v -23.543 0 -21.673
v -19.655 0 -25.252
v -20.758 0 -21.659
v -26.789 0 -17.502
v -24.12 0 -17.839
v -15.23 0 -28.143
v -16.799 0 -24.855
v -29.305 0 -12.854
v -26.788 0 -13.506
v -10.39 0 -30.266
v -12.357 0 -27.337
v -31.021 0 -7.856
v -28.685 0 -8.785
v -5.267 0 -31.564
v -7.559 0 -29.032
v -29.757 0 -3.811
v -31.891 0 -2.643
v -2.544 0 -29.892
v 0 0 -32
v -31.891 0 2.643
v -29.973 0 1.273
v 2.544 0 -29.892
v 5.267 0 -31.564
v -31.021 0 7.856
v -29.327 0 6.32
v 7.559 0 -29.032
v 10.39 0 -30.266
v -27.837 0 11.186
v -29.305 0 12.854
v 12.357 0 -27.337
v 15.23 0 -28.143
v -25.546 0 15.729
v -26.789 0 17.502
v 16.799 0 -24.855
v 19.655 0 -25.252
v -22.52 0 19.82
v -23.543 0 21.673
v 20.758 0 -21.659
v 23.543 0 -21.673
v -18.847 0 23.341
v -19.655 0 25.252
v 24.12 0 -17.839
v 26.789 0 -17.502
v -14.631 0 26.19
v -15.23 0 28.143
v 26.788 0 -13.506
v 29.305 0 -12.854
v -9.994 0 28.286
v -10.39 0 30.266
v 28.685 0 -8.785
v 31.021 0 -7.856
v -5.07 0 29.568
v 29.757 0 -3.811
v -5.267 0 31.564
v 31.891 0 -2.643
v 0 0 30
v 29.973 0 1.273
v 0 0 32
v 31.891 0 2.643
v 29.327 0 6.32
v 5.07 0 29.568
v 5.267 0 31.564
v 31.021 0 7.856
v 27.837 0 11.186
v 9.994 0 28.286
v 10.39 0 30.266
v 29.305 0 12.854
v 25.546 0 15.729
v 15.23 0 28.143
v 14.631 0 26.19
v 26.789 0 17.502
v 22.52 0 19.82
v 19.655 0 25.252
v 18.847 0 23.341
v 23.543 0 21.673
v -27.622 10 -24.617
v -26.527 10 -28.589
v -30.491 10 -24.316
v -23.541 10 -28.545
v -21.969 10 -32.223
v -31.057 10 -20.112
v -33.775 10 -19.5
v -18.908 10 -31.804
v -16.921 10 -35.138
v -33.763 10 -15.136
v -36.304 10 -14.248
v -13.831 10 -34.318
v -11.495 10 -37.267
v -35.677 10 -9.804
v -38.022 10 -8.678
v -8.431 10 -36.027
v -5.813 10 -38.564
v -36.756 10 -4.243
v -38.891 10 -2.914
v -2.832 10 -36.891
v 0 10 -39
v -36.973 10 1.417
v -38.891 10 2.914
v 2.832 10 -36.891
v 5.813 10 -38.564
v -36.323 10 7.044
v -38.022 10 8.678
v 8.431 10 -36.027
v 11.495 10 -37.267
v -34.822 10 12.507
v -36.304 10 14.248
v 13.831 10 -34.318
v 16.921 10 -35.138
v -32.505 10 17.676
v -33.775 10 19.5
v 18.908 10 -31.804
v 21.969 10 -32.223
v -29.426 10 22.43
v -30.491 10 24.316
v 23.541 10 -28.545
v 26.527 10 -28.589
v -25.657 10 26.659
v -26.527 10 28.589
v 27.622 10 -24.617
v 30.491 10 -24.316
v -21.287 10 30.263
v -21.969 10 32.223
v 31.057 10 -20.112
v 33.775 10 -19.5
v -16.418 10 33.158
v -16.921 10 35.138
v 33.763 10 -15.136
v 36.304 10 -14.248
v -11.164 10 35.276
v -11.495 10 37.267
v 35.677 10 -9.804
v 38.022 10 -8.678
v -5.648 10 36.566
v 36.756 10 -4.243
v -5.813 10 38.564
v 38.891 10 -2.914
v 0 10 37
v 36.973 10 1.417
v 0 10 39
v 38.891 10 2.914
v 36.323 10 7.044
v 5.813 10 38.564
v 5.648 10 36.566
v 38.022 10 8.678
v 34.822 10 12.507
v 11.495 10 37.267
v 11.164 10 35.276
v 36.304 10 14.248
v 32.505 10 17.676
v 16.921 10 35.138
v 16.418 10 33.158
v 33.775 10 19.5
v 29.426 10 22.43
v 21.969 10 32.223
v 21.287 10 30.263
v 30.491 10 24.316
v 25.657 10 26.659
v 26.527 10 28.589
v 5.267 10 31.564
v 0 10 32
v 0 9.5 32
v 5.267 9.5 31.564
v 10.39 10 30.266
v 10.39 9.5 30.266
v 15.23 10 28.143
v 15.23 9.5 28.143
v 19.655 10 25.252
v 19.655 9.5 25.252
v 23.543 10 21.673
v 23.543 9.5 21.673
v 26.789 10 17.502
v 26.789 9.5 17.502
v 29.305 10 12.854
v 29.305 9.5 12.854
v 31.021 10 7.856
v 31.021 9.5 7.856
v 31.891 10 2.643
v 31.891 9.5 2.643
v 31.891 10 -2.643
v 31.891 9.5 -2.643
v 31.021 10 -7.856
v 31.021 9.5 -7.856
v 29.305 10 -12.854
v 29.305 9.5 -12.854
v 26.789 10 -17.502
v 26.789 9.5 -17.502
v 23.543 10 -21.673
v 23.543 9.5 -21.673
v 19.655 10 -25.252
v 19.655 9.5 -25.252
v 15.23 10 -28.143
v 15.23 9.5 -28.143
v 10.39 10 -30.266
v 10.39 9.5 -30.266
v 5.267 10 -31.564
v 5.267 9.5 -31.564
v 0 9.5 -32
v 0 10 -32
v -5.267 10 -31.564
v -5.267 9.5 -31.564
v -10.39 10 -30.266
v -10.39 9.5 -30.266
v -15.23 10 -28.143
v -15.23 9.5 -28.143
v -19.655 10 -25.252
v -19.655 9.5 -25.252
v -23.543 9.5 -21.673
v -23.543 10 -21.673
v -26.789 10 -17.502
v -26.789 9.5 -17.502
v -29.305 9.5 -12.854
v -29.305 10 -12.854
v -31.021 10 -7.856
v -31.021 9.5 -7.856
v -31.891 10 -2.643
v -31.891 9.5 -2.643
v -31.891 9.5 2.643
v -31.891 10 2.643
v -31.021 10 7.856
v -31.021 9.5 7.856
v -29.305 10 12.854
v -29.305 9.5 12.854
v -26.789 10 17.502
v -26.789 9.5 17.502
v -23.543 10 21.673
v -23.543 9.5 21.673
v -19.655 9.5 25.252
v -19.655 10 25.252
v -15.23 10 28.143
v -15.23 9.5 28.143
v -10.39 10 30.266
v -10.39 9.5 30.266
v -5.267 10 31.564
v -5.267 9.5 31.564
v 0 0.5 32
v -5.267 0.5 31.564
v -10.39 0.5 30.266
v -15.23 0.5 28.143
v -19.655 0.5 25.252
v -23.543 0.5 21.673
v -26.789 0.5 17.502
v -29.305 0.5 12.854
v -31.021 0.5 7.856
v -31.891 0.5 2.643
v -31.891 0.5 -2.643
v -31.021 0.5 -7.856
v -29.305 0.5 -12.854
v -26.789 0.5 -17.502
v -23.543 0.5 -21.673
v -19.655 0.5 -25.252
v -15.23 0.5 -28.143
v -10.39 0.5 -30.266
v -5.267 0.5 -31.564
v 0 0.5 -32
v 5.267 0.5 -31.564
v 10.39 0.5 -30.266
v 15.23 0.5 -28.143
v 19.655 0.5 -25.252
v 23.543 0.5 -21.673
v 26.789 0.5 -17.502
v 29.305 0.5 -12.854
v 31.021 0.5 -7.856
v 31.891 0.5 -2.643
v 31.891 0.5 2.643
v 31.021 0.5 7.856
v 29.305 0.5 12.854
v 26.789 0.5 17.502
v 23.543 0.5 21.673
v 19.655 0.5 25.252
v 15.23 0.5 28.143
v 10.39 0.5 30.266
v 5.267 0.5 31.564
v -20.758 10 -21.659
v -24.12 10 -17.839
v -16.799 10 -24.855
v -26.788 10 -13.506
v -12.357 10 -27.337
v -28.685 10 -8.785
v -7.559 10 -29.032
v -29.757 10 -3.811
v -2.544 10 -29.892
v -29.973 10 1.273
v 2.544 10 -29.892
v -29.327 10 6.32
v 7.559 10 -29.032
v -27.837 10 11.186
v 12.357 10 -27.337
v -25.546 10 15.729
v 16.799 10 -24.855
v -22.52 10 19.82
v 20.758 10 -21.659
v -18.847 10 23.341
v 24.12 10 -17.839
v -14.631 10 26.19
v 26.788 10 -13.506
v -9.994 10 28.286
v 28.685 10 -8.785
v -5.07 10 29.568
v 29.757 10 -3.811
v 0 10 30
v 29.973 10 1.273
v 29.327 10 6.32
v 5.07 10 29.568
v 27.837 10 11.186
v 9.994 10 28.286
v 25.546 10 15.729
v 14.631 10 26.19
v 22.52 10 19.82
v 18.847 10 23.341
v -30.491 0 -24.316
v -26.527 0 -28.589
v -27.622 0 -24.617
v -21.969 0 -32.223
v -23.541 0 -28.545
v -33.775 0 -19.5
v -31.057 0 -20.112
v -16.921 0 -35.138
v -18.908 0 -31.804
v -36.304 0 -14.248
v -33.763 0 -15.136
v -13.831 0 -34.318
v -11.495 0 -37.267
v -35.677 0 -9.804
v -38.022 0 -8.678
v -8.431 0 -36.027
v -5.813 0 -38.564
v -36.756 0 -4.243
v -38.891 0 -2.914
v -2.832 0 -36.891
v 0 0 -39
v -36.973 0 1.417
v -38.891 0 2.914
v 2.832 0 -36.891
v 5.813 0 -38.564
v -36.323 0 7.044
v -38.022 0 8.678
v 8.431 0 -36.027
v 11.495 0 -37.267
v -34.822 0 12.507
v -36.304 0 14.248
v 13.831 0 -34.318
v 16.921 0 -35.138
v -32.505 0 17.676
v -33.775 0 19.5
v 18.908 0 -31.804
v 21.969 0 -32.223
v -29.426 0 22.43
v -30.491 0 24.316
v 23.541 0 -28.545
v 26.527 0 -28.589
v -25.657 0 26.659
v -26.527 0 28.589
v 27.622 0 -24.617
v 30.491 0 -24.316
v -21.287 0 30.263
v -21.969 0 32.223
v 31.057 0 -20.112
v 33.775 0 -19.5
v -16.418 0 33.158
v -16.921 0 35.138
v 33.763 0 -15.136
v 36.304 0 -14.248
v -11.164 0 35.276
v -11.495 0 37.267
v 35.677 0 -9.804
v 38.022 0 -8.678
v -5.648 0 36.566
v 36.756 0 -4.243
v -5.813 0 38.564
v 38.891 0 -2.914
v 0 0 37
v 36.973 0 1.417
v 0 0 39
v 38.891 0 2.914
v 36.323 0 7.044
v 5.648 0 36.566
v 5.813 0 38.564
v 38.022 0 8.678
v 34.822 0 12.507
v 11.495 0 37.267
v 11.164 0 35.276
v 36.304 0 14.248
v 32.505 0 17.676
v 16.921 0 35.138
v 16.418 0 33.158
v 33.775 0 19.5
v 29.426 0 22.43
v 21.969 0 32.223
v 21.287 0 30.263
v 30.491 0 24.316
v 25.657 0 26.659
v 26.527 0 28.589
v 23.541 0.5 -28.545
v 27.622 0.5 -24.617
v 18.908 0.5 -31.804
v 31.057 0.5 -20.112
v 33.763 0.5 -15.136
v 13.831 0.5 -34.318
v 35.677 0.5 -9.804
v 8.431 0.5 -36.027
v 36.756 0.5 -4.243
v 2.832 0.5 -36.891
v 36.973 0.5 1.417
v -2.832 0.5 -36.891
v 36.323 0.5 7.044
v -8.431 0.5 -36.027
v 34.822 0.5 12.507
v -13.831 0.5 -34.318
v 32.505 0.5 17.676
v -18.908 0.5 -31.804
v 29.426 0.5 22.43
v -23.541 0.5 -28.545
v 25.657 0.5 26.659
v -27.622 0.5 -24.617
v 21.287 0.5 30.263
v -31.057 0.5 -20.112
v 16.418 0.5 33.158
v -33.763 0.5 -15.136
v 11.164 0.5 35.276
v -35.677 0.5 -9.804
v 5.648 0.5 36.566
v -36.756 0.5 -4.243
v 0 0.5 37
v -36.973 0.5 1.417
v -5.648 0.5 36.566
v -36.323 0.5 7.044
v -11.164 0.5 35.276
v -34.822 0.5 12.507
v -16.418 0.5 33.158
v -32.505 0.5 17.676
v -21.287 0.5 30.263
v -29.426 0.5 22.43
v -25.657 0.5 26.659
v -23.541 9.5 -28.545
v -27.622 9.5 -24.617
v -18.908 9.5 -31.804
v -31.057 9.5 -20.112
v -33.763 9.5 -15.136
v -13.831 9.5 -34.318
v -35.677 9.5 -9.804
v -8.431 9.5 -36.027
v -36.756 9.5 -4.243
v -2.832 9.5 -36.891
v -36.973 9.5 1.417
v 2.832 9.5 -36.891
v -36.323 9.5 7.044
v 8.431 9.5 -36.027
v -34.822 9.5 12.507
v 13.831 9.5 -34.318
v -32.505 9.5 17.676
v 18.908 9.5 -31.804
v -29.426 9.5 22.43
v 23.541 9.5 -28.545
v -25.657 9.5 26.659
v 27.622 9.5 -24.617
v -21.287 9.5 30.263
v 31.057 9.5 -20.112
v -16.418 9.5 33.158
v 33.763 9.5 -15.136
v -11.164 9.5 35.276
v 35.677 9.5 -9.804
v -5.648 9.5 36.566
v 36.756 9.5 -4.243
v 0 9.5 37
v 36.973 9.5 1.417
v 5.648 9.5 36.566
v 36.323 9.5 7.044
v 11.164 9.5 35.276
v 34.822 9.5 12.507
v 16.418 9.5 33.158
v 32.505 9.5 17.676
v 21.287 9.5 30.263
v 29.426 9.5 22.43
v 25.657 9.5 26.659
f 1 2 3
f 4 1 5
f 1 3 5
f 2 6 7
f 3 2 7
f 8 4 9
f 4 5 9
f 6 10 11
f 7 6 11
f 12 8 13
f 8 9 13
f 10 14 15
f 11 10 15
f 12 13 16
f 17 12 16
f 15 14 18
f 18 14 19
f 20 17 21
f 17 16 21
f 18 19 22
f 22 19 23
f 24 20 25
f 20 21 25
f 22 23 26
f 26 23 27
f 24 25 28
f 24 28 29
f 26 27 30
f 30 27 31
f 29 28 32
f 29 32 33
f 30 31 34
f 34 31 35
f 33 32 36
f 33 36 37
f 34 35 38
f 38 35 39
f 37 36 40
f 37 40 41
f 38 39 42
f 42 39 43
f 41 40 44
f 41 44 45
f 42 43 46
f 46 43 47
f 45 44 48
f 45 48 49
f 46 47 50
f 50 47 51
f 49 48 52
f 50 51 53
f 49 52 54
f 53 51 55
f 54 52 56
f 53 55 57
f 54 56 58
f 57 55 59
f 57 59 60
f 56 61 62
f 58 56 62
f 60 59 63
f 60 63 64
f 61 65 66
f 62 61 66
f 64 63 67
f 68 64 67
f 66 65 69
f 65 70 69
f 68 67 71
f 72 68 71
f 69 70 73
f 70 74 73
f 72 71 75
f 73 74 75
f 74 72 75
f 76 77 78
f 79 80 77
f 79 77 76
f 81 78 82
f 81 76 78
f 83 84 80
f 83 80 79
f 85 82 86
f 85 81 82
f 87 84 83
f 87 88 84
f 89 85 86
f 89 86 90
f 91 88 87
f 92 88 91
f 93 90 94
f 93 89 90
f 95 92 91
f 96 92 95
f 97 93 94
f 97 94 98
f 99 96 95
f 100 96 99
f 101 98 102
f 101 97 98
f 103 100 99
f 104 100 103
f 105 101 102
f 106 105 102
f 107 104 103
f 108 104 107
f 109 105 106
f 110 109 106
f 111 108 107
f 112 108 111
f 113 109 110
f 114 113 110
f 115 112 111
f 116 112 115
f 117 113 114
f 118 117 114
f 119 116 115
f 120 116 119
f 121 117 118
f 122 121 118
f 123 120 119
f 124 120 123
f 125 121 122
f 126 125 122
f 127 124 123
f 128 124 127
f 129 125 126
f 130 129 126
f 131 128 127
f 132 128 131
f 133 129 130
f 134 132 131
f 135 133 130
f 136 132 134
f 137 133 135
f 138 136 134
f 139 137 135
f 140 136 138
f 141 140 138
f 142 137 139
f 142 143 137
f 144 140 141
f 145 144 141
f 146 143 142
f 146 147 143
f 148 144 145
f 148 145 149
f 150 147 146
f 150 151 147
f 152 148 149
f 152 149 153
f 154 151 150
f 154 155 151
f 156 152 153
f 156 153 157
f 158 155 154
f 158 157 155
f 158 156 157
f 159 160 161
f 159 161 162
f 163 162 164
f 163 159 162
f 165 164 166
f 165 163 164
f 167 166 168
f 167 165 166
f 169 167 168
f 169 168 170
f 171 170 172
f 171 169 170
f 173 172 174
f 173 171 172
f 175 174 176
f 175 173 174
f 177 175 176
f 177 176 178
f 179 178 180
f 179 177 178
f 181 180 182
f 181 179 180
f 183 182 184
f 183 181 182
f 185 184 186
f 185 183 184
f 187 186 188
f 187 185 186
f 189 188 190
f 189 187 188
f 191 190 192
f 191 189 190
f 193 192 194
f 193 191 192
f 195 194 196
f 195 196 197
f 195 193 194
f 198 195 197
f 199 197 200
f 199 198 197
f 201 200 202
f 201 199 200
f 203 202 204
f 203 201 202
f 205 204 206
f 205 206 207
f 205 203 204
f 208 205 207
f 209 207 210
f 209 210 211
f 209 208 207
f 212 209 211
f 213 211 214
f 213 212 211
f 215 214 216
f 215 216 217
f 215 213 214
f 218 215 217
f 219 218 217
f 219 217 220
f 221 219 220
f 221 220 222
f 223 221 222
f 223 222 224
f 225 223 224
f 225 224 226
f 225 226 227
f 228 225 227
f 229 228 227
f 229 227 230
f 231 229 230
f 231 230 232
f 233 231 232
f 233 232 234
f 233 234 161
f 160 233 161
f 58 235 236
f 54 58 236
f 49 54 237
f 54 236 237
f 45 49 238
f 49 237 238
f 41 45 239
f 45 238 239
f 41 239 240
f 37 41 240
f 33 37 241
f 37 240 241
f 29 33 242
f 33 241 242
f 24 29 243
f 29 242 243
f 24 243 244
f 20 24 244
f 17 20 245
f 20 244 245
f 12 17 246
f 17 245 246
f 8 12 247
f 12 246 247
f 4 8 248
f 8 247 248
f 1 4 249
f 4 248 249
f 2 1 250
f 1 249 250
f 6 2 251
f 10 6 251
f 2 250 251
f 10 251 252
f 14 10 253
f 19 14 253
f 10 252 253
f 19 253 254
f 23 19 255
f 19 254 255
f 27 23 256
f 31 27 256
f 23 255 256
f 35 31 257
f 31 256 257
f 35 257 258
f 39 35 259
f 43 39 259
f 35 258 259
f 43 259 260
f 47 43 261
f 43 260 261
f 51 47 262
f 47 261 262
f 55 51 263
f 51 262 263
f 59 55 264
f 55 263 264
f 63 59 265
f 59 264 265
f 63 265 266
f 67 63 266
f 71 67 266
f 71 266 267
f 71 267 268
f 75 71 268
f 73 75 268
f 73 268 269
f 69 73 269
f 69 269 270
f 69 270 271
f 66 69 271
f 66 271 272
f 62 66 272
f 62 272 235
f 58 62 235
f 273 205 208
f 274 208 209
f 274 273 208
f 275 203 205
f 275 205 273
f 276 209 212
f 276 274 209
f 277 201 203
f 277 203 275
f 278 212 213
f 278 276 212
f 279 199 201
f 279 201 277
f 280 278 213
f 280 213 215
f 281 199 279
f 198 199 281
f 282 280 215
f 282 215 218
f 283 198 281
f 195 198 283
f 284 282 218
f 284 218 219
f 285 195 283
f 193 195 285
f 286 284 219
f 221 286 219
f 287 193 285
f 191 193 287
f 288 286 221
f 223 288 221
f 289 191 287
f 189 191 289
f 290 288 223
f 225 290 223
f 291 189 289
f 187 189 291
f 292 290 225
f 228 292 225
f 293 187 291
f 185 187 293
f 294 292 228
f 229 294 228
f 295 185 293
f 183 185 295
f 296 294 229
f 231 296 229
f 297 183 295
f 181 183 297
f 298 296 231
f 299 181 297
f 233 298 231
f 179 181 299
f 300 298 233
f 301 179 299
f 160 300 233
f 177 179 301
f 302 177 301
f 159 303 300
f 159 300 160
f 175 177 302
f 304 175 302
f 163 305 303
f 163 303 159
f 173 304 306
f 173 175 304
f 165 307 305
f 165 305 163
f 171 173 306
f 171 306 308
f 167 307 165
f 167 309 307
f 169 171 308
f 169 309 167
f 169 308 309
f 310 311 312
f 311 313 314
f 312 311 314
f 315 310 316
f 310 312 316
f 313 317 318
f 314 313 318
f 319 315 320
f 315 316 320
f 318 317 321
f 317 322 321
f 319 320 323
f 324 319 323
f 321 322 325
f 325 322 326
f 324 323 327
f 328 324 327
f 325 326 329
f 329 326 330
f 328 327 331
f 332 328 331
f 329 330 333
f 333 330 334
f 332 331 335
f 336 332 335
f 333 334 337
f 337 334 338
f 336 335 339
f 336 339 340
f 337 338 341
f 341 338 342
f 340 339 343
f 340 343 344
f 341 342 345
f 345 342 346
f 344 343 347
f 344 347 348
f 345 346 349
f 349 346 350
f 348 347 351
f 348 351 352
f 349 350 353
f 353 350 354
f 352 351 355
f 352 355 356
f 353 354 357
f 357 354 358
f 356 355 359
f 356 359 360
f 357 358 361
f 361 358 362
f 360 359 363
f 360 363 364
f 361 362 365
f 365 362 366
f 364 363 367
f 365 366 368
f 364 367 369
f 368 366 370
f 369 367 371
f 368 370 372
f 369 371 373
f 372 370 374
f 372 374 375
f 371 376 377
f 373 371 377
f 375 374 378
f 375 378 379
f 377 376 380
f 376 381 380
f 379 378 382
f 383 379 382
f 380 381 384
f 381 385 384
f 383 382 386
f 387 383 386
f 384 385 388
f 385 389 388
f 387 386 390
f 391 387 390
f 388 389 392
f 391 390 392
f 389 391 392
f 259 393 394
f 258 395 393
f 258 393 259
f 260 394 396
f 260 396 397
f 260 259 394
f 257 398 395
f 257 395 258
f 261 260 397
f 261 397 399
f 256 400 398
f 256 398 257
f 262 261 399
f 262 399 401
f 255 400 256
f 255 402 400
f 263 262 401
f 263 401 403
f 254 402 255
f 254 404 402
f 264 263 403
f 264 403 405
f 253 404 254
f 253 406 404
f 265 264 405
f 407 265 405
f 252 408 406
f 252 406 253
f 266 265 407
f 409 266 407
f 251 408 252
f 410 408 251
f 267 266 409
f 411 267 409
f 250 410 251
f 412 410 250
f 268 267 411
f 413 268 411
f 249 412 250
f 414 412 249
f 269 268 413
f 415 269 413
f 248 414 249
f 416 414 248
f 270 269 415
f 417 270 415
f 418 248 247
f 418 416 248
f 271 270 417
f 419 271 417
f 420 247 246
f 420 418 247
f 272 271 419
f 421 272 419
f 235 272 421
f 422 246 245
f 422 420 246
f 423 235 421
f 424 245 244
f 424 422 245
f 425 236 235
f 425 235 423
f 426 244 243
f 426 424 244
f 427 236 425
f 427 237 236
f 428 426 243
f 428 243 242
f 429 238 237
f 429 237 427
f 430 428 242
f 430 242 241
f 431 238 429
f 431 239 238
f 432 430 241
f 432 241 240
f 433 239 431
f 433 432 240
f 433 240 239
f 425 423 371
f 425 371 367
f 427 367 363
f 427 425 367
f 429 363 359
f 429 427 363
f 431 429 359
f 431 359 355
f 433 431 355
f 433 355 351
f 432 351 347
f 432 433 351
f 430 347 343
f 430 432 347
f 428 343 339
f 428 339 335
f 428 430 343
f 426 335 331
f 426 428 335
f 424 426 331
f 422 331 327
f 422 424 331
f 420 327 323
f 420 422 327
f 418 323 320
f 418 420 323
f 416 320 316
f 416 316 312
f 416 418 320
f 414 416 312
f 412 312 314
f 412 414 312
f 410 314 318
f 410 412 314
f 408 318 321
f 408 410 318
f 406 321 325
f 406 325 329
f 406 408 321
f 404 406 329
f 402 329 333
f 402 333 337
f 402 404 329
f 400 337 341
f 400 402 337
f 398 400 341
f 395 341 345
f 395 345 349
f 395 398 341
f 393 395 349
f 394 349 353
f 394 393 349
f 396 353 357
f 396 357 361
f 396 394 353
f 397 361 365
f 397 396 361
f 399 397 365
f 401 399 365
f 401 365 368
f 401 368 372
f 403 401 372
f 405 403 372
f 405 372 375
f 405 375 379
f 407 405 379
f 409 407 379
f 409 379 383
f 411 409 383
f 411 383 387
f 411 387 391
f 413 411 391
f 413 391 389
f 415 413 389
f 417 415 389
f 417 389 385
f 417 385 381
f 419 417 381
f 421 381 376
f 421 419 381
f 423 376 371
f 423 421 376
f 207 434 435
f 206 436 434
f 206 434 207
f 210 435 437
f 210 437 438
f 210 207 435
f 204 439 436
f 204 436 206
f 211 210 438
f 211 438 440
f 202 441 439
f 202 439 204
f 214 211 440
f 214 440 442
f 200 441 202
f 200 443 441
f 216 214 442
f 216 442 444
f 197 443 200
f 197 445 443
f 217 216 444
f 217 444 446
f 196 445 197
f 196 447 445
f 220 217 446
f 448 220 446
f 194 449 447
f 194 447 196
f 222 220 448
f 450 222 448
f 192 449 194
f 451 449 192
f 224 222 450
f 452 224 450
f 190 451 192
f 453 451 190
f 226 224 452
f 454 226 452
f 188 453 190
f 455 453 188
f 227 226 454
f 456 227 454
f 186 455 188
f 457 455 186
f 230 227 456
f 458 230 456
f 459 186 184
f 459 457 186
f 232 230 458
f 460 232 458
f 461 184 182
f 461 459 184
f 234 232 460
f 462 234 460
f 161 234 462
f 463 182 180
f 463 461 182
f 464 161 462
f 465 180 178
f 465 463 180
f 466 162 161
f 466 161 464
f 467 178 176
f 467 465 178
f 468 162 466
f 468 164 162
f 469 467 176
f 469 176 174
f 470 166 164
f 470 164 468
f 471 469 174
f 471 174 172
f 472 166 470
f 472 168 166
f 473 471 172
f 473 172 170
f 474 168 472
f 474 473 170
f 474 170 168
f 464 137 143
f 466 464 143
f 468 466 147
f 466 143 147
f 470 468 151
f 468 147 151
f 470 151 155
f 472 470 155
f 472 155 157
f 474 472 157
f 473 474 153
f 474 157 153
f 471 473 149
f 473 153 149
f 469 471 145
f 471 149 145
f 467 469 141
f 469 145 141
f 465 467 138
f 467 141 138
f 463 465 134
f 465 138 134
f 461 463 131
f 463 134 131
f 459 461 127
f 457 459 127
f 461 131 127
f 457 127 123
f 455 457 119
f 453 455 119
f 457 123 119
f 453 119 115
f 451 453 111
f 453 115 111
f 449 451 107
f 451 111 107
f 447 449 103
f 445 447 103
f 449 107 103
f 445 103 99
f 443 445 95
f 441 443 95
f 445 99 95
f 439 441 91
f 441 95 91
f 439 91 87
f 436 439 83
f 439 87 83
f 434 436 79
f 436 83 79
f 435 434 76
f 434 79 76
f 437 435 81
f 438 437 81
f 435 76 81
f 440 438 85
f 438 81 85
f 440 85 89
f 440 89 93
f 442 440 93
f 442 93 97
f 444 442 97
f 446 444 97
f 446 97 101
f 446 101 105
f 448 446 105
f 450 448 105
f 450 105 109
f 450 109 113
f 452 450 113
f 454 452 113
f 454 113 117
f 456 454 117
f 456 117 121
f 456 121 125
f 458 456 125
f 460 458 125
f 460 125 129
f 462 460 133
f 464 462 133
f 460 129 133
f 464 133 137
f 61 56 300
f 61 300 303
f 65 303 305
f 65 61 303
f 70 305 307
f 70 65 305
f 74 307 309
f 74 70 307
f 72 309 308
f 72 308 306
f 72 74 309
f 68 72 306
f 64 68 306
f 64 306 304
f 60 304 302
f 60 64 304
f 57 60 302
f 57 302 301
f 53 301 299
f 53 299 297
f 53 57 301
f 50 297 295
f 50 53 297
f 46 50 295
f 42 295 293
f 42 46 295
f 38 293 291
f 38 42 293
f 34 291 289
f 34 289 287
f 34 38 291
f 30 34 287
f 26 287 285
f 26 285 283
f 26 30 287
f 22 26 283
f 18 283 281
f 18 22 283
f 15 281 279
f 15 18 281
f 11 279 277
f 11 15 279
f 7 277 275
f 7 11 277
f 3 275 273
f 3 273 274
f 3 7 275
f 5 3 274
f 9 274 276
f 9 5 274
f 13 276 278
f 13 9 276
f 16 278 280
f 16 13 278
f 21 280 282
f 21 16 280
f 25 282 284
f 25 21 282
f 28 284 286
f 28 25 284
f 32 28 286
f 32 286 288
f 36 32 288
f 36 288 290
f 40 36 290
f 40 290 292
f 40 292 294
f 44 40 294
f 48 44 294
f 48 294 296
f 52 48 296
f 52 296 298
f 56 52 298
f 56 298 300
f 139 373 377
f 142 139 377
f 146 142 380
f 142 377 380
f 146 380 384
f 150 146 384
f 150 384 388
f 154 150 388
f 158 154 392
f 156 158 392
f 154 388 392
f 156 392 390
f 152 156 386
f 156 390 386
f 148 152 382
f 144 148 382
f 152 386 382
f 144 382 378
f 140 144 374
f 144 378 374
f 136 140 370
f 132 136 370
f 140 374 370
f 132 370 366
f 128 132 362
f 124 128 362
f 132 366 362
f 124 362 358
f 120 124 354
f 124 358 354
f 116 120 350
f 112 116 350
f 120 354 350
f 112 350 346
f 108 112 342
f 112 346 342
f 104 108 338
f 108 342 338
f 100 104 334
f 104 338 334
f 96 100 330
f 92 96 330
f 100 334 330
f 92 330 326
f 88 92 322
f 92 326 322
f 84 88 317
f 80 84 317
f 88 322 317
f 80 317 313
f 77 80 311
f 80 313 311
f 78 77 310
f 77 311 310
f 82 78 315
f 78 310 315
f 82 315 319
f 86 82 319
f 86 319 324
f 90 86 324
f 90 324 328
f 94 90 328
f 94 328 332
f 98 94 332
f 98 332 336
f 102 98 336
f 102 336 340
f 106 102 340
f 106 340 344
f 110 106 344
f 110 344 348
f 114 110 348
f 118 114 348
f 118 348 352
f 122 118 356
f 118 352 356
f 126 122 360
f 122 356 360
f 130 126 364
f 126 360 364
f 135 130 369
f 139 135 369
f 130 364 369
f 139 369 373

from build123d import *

# Parameters (mm, degrees)
SKETCH1_R           = 39
SKETCH1_R_2         = 30
BOSS_EXTRUDE1_DEPTH = 10
SKETCH2_R           = 37
SKETCH2_R_2         = 32
CUT_EXTRUDE1_DEPTH  = 0.5
CUT_EXTRUDE2_START  = -0.5
SKETCH3_R           = 37
SKETCH3_R_2         = 32
CUT_EXTRUDE2_DEPTH  = 0.5


with BuildPart() as part:
    # Sketch1 → Boss-Extrude1 (new body)
    with BuildSketch(Plane(origin=(0, 0, 0), x_dir=(1, 0, 0), z_dir=(0, 1, 0))):
        with Locations(Location((0, 0, 0), (0, 0, 270))):
            Circle(SKETCH1_R)
        with Locations(Location((0, 0, 0), (0, 0, 270))):
            Circle(SKETCH1_R_2, mode=Mode.SUBTRACT)
    extrude(amount=BOSS_EXTRUDE1_DEPTH)

    # Sketch2 → Cut-Extrude1 (cut)
    with BuildSketch(Plane(origin=(0, 10, 0), x_dir=(1, 0, 0), z_dir=(0, 1, 0))):
        with Locations(Location((0, 0, 0), (0, 0, 270))):
            Circle(SKETCH2_R)
        with Locations(Location((0, 0, 0), (0, 0, 270))):
            Circle(SKETCH2_R_2, mode=Mode.SUBTRACT)
    extrude(amount=-CUT_EXTRUDE1_DEPTH, mode=Mode.SUBTRACT)

    # Sketch3 → Cut-Extrude2 (cut)
    with BuildSketch(Plane.XZ.offset(CUT_EXTRUDE2_START)):
        with Locations(Location((0, 0, 0), (0, 0, 90))):
            Circle(SKETCH3_R)
        with Locations(Location((0, 0, 0), (0, 0, 90))):
            Circle(SKETCH3_R_2, mode=Mode.SUBTRACT)
    extrude(amount=CUT_EXTRUDE2_DEPTH, mode=Mode.SUBTRACT)


solid = part.part
